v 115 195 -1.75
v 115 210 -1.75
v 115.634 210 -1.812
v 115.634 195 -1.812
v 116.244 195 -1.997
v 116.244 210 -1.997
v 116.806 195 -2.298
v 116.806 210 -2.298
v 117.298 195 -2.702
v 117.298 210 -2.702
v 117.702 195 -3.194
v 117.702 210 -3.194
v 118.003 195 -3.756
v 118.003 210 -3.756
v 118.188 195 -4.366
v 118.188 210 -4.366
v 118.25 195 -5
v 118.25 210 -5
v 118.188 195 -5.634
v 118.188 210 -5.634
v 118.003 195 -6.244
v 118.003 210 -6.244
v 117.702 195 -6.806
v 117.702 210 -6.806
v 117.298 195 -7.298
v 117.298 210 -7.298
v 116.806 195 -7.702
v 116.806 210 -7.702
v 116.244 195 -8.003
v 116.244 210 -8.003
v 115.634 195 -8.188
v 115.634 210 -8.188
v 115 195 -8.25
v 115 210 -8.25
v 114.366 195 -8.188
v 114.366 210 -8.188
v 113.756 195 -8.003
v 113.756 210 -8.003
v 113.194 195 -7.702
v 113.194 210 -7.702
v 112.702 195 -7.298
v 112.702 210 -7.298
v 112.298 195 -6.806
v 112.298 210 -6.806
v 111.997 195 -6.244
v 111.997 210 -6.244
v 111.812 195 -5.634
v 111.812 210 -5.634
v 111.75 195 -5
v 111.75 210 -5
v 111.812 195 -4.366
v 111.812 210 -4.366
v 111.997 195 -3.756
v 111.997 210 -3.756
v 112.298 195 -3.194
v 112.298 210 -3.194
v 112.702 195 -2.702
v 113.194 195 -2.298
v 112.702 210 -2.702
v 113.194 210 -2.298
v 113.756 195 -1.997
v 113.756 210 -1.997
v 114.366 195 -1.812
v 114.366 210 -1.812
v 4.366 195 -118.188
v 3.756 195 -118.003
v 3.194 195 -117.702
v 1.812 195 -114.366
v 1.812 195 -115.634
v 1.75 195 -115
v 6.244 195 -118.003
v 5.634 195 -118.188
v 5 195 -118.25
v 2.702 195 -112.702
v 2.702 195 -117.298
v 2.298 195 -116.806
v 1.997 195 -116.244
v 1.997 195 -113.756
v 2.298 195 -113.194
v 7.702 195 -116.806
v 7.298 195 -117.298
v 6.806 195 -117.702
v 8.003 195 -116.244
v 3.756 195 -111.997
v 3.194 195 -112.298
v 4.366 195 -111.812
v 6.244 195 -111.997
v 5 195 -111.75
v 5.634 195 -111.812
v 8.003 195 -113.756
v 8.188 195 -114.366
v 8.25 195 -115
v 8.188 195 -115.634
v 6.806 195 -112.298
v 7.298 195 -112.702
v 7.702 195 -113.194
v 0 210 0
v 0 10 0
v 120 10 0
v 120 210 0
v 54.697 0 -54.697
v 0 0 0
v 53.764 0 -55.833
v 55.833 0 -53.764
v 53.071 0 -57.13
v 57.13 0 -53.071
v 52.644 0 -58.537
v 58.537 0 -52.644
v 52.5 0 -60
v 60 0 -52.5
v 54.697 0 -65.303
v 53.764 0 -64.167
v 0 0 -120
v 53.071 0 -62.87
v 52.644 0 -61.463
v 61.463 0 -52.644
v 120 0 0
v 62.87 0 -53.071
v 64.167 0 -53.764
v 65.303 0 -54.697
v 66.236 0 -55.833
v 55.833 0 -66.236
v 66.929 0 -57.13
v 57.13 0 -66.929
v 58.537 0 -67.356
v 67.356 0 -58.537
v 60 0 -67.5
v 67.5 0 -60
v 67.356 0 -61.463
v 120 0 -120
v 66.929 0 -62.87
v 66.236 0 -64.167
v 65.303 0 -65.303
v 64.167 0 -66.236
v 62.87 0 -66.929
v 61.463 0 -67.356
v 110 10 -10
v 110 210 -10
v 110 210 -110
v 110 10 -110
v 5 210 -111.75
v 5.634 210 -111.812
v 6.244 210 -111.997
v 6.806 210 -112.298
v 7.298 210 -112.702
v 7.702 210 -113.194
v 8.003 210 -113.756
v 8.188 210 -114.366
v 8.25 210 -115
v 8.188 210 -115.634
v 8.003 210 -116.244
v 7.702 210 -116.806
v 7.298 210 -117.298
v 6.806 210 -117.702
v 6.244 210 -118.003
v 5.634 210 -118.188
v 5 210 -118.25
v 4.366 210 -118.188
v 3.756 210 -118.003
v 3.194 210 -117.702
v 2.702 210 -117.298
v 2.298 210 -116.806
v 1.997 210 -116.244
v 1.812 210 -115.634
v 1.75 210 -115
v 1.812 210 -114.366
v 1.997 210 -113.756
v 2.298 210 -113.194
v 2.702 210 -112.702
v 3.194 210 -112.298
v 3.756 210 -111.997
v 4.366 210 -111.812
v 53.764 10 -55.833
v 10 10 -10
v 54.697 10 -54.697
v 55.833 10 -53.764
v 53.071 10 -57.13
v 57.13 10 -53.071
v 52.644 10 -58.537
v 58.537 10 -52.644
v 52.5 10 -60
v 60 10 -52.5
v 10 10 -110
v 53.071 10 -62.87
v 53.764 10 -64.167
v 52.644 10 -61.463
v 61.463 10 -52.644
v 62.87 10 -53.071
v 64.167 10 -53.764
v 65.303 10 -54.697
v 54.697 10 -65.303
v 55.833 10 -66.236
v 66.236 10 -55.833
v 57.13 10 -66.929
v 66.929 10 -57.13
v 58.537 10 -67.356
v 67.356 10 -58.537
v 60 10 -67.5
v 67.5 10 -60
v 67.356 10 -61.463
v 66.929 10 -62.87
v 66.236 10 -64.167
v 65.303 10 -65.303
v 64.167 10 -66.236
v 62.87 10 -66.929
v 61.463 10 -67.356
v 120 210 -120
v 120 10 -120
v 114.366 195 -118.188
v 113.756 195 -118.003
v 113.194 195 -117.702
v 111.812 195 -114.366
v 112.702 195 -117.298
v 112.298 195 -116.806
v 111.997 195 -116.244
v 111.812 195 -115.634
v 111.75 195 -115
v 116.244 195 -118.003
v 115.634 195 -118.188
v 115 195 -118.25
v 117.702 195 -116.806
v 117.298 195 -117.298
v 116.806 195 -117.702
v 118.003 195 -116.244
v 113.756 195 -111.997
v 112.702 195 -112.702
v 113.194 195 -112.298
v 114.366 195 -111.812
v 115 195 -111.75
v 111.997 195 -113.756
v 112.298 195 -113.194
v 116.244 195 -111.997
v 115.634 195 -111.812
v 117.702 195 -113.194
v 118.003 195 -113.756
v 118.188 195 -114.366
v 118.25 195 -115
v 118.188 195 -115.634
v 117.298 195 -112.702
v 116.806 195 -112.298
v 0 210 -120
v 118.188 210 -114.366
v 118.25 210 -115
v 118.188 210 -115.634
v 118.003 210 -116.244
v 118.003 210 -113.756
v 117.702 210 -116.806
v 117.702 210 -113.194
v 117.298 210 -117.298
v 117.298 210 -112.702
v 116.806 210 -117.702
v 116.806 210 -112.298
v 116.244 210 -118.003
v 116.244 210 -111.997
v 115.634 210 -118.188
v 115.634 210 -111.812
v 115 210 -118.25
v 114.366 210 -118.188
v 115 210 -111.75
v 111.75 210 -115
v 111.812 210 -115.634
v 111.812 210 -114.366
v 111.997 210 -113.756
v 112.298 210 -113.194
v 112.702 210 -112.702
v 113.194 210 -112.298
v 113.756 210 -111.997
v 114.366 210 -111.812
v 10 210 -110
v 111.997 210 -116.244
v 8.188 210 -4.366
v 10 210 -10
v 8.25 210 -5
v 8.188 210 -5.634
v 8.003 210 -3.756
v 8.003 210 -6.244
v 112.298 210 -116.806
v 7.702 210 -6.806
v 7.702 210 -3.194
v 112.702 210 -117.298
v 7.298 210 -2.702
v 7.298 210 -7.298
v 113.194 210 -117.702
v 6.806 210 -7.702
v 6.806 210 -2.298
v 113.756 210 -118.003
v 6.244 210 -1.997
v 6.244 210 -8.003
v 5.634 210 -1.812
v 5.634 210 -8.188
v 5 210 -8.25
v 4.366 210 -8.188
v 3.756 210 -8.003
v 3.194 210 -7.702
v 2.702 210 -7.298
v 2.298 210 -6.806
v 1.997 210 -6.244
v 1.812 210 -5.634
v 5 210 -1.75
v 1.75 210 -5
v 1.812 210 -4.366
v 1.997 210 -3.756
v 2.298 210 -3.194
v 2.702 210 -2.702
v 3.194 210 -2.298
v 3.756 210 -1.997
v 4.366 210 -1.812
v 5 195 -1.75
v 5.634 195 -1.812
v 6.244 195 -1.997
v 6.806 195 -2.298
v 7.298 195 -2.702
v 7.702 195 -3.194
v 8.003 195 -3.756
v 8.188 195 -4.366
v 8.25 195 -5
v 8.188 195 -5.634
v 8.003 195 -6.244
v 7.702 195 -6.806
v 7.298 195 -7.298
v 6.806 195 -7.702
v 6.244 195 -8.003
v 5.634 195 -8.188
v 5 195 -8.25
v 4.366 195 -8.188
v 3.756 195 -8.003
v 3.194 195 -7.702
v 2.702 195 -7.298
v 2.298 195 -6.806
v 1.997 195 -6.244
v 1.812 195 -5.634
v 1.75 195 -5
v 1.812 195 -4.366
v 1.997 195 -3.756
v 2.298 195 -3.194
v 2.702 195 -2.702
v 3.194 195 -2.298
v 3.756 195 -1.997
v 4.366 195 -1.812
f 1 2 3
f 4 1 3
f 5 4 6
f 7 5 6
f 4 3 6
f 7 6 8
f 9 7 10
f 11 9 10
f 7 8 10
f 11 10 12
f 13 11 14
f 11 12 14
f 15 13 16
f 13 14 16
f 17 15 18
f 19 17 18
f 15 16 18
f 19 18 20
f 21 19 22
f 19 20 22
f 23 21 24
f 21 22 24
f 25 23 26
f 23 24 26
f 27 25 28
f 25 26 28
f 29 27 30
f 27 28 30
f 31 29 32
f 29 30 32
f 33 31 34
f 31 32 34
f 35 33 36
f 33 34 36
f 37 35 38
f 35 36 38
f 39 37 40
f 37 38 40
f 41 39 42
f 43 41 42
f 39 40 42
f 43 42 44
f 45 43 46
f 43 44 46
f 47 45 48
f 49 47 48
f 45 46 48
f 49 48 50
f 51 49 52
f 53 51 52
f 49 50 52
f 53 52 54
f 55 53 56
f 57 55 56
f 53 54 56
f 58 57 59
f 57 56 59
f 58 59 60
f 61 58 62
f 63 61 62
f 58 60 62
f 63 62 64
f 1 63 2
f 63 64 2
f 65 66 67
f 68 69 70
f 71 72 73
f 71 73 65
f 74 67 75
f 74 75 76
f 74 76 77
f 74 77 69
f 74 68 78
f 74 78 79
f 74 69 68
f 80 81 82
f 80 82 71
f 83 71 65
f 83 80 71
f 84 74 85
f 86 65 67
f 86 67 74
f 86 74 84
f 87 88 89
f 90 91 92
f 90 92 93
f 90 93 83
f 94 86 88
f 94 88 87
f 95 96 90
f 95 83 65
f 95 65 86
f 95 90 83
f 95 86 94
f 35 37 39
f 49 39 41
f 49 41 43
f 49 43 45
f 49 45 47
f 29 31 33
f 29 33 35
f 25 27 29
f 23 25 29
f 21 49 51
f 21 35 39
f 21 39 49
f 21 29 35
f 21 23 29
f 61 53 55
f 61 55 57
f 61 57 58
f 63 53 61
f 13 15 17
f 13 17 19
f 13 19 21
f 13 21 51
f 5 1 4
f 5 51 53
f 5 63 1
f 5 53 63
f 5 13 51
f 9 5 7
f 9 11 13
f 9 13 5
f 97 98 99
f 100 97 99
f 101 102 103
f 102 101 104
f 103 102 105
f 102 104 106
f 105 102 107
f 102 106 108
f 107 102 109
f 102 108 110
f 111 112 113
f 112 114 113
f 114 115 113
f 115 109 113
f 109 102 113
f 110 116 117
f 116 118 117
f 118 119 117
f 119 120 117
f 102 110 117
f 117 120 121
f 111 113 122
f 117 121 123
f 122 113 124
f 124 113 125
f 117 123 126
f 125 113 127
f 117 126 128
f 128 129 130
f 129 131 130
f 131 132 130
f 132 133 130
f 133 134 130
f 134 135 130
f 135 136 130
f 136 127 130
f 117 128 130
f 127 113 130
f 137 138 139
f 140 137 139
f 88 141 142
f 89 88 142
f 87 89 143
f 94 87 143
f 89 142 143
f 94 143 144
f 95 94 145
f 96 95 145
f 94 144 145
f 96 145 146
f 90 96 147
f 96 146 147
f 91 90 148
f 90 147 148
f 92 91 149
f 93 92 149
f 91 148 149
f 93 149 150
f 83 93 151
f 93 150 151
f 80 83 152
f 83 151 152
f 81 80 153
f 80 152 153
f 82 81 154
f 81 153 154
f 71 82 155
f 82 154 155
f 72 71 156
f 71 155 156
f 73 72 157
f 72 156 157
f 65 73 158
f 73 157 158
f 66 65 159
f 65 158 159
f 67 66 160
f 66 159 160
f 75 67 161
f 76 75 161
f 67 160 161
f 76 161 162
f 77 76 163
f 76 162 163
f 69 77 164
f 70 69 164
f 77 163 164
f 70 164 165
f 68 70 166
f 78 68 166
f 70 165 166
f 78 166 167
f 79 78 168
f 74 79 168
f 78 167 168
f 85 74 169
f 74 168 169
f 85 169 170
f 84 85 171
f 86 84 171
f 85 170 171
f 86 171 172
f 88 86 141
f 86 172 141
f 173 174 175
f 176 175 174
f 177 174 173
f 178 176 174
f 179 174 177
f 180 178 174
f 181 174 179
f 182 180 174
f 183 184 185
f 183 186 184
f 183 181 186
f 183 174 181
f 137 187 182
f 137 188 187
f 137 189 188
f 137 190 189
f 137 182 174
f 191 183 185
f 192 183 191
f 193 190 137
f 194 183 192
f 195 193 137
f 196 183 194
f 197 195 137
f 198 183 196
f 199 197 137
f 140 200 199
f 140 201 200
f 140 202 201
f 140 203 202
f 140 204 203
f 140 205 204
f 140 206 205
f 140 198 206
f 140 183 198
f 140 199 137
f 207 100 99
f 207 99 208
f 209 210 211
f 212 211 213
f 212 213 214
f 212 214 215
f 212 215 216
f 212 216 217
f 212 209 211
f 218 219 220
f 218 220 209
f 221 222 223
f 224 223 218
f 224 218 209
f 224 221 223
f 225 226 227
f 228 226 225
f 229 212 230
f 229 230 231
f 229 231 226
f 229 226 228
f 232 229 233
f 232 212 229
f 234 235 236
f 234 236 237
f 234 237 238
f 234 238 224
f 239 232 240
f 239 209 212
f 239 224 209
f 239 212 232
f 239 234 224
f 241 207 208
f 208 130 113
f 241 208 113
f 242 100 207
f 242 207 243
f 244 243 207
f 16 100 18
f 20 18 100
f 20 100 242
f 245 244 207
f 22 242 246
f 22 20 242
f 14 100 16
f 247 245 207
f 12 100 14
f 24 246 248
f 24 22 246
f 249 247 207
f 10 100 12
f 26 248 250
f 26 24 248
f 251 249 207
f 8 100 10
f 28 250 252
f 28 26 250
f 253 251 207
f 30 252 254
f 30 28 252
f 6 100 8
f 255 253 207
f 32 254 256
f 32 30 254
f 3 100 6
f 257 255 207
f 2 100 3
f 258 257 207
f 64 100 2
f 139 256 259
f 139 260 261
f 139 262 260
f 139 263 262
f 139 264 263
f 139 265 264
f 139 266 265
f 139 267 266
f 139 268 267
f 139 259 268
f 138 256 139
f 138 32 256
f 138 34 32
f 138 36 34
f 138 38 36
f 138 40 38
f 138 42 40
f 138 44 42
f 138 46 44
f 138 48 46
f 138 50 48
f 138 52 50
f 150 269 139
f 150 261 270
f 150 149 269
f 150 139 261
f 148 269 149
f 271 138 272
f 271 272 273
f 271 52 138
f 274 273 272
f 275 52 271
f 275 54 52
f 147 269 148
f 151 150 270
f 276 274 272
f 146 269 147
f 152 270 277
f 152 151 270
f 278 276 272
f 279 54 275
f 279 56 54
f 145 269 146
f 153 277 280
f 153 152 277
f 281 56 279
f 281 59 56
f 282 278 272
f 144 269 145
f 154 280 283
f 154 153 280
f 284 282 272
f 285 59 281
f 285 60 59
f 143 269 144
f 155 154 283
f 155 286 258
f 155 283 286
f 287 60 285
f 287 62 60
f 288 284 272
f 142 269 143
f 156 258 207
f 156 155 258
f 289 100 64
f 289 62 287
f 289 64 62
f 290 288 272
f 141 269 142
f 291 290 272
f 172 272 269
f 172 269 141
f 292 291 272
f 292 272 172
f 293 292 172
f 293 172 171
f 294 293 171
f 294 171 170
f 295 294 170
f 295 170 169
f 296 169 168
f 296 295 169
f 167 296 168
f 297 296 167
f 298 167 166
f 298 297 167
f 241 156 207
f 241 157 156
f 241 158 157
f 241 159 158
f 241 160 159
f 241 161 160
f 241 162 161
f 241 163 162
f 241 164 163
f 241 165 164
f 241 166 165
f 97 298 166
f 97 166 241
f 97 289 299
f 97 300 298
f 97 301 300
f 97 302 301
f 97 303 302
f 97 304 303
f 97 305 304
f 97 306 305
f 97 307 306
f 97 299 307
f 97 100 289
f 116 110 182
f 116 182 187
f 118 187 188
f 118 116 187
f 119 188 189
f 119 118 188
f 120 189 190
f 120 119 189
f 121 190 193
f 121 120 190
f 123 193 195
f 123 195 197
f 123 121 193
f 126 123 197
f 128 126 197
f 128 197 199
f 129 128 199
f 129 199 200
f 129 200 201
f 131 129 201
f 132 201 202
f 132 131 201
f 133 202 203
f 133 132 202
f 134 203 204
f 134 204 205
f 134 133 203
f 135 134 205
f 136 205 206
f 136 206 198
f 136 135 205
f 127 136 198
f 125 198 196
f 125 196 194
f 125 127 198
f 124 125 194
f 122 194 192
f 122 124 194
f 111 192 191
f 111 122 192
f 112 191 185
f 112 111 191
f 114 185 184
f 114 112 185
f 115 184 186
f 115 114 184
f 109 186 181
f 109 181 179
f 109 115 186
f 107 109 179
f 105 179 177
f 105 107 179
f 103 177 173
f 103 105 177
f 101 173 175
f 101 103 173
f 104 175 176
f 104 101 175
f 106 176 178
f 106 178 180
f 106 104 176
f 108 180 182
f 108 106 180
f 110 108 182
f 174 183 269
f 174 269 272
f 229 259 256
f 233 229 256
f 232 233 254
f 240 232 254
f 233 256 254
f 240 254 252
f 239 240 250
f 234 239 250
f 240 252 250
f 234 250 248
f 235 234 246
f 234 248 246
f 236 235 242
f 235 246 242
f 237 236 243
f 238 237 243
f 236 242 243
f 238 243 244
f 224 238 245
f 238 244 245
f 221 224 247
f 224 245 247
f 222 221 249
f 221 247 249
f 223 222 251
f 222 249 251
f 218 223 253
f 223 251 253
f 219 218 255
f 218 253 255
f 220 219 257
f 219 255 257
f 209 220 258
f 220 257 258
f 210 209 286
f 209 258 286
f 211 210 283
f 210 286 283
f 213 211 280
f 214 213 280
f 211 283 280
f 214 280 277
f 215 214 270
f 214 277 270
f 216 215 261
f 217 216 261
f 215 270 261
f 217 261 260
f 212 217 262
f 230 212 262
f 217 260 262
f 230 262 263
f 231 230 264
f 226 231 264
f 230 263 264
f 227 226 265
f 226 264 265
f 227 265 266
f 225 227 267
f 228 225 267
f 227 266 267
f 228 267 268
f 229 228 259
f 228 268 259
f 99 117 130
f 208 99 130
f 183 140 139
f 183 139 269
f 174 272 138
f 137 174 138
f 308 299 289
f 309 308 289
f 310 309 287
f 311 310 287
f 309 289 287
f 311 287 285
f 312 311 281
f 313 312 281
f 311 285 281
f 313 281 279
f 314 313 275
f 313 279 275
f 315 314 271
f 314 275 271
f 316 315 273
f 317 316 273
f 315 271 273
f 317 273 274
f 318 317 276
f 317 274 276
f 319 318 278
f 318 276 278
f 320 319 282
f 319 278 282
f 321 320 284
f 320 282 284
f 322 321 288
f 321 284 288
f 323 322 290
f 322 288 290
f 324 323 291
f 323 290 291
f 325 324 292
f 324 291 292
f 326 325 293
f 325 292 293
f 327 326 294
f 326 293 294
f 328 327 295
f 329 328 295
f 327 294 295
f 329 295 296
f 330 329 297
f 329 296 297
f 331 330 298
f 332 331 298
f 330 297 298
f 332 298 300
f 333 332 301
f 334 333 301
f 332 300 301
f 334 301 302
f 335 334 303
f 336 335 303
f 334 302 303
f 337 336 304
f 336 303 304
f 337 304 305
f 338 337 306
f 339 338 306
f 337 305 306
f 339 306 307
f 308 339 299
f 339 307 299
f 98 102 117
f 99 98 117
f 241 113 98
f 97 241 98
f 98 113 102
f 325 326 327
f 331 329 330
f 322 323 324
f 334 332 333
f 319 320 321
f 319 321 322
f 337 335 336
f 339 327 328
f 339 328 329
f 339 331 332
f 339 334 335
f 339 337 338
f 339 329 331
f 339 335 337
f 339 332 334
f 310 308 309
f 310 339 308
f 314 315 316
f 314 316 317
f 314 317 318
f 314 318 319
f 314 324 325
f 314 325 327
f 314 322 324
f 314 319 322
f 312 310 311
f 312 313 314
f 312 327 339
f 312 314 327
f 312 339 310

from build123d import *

# Parameters (mm, degrees)
SKETCH1_W           = 120
SKETCH1_H           = 120
SKETCH1_R           = 7.5
BOSS_EXTRUDE1_DEPTH = 10
BOSS_EXTRUDE2_DEPTH = 200
SKETCH2_R           = 3.25
CUT_EXTRUDE1_DEPTH  = 15


with BuildPart() as part:
    # Sketch1 → Boss-Extrude1 (new body)
    with BuildSketch(Plane(origin=(0, 0, 0), x_dir=(1, 0, 0), z_dir=(0, 1, 0))):
        with Locations((60, 60)):
            Rectangle(SKETCH1_W, SKETCH1_H)
        with Locations(Location((60, 60, 0), (0, 0, 270))):
            Circle(SKETCH1_R, mode=Mode.SUBTRACT)
    extrude(amount=BOSS_EXTRUDE1_DEPTH)

    # 3DSketch1 → Boss-Extrude2 (add)
    with BuildSketch(Plane(origin=(110, 10, -10), x_dir=(-0.7071067811865477, 0, -0.7071067811865475), z_dir=(0, 1, 0))):
        Polygon((155.563491861, 0), (70.710678119, 84.852813742), (-14.142135624, 0), (70.710678119, -84.852813742), align=None)
        Polygon((0, 0), (70.710678119, -70.710678119), (141.421356237, 0), (70.710678119, 70.710678119), align=None, mode=Mode.SUBTRACT)
    extrude(amount=BOSS_EXTRUDE2_DEPTH)

    # Sketch2 → Cut-Extrude1 (cut)
    with BuildSketch(Plane(origin=(0, 210, 0), x_dir=(1, 0, 0), z_dir=(0, 1, 0))):
        with Locations(Location((115, 115, 0), (0, 0, 270))):
            Circle(SKETCH2_R)
        with Locations(Location((5, 115, 0), (0, 0, 270))):
            Circle(SKETCH2_R)
        with Locations(Location((115, 5, 0), (0, 0, 270))):
            Circle(SKETCH2_R)
        with Locations(Location((5, 5, 0), (0, 0, 270))):
            Circle(SKETCH2_R)
    extrude(amount=-CUT_EXTRUDE1_DEPTH, mode=Mode.SUBTRACT)


solid = part.part
